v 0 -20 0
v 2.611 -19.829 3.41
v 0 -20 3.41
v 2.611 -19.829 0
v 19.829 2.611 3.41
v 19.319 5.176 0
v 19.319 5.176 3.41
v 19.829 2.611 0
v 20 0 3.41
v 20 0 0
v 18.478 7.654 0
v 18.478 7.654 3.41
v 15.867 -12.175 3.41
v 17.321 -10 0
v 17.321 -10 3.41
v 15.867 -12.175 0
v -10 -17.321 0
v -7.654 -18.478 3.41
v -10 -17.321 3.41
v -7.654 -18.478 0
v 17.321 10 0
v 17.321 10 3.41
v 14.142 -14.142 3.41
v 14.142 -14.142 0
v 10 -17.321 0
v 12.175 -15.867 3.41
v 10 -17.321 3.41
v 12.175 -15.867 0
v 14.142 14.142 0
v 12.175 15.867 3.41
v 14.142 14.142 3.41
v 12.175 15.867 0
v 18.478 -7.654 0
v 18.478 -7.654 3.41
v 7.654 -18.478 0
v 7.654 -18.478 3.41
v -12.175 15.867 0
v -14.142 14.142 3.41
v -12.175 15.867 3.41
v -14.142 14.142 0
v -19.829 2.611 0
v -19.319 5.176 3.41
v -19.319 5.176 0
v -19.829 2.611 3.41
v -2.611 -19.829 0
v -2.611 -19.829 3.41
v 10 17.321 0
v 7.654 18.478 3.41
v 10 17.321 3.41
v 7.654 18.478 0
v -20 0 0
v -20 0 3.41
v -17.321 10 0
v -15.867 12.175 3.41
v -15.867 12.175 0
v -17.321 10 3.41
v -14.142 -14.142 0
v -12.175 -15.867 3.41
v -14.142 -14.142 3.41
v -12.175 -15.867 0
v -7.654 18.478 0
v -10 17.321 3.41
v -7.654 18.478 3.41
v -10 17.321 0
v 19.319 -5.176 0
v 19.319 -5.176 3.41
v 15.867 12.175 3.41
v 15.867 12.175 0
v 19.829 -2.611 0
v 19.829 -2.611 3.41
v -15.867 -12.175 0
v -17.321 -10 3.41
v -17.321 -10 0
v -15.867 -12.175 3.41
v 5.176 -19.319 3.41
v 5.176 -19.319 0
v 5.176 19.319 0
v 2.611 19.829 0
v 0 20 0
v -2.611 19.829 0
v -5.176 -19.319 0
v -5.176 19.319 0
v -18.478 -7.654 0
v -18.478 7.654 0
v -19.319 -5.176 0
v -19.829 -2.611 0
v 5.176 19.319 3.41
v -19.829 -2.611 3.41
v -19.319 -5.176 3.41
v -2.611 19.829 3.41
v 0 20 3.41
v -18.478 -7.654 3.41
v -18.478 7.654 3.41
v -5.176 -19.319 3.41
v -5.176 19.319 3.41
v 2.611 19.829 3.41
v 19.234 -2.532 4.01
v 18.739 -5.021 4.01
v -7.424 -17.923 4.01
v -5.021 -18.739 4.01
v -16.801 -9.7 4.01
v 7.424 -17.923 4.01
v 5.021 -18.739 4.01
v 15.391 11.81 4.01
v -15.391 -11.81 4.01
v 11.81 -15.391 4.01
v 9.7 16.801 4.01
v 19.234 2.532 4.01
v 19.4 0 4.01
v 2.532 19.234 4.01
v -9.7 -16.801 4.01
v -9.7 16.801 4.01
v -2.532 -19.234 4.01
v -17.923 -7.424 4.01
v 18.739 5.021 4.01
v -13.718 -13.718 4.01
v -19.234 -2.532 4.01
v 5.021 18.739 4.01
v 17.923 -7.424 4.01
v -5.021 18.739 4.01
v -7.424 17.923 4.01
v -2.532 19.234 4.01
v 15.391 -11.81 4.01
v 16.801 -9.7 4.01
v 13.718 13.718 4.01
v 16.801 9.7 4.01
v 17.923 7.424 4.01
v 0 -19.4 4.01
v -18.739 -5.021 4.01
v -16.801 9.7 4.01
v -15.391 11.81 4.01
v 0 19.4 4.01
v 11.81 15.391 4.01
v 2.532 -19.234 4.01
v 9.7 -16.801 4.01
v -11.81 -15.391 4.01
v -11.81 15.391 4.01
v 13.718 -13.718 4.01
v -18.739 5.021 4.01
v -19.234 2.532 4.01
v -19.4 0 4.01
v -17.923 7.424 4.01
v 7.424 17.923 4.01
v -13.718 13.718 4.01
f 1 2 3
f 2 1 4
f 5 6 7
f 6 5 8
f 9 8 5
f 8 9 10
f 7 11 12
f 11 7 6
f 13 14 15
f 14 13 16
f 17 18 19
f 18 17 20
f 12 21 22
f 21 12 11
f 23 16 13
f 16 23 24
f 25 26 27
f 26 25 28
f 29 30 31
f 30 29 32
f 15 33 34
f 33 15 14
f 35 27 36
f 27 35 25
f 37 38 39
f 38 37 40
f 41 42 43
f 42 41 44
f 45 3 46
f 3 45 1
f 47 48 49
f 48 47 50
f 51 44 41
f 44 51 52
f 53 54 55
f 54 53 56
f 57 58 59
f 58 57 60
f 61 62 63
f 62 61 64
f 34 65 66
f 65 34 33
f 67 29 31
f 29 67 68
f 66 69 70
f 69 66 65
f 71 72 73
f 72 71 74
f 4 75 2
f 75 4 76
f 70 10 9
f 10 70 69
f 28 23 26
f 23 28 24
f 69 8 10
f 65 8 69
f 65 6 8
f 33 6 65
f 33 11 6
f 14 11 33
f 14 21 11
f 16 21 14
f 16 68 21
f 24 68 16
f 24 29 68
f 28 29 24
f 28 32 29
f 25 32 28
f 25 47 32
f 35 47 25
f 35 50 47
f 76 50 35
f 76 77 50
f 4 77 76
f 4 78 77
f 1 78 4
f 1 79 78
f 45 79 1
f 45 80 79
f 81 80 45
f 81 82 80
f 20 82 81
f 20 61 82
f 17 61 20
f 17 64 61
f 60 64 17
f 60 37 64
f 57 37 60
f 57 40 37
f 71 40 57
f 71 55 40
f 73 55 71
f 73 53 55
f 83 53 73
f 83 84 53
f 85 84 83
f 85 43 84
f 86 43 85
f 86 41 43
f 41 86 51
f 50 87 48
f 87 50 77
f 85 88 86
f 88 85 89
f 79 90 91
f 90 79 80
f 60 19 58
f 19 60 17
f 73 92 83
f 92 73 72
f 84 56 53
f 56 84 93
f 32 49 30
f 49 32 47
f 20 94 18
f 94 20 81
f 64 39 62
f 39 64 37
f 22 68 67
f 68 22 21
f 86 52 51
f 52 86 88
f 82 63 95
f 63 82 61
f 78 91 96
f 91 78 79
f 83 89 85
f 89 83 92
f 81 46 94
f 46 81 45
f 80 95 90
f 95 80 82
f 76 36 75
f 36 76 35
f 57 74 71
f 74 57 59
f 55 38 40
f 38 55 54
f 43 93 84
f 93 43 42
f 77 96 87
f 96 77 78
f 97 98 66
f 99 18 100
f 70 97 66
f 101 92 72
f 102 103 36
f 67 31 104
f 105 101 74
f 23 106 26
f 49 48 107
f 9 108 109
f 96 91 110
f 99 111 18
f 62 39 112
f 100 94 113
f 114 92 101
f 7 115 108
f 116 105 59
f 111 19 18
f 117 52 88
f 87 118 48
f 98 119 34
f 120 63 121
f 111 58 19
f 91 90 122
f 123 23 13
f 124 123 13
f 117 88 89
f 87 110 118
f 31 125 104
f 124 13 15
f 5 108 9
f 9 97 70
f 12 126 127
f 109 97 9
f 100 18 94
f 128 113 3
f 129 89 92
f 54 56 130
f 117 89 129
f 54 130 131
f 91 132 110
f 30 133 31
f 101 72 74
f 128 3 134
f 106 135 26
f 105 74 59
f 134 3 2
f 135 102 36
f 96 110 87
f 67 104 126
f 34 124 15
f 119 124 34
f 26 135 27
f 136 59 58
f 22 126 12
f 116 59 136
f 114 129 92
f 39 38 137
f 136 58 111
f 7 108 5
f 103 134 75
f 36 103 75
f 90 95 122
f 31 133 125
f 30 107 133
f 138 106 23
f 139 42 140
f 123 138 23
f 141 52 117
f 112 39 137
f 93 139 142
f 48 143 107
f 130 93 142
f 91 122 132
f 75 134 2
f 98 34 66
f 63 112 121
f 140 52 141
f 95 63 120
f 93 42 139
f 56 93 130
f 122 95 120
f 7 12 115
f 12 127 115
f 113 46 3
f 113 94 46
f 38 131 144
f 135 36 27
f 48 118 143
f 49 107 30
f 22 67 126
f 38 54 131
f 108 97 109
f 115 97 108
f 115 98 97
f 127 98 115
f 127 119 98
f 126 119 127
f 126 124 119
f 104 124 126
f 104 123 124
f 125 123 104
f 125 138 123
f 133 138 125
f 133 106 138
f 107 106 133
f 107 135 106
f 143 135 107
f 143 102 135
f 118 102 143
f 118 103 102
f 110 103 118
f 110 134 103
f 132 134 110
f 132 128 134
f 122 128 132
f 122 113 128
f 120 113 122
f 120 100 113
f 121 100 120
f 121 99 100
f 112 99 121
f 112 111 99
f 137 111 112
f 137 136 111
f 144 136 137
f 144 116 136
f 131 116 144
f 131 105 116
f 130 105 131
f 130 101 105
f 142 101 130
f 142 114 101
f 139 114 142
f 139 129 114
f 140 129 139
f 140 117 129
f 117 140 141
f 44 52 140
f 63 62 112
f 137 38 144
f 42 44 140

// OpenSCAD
// file: connector.scad
// Shared board-model geometry for the puzzle chess board.
//
// The cell, the pin and the platform all `include` this file so their
// mating dimensions can never drift apart. It defines named dimensions
// only (no top-level geometry), so including it renders nothing on its
// own. Three joints live here:
//   * cell <-> pin      : the dumbbell connector (bottom-loading grooves)
//   * cell <-> platform : the round central socket
//
// ---- Cell footprint ----
cell_size     = 50;   // square tile edge (mm) — a standard tournament cell
corner_radius = 5;    // radius of the rounded vertical corners

// ---- Clearance ----
// Fit control: every mating part differs from its cavity by this much on every
// face. A POSITIVE value is clearance (part shrunk — slides in with a gap); zero
// is a nominal (interference) fit that grips via FDM over-extrusion/roughness.
// Applied ONCE per joint — the cavity is drawn at its nominal size and the
// inserted part is offset by the gap. (Do not also resize the cavity; that
// double-counts the gap.)
// connector_gap is the default (platform joint); the pin uses its own pin_gap
// so the two joints can be tuned independently.
connector_gap = 0;  // platform disc: nominal (interference) fit, same as the pin.
                    // Clearances 0.1 / 0.05 / 0.02 per side all printed with
                    // side-to-side play, so grip on the nominal size instead.
pin_gap       = 0;     // pin-joint clearance per face — nominal (interference) fit,
                       // relies on FDM over-extrusion/roughness to grip firmly
// Deliberate gap left between two joined cells. The dumbbell's waist spans
// this gap, so small height differences between adjacent battlefield tiles
// read as natural seams rather than a visible step.
cell_gap      = 2;

// ---- Dumbbell connector: cell <-> pin ----
// A flat dumbbell-shaped tab lies in a pocket that is OPEN AT THE BOTTOM of
// each cell, so pins drop straight in (or out) from underneath the board —
// even for a tile in the middle of an assembled field, where the old
// side-sliding pin could never reach. Each cell captures one bulb of the
// dumbbell; the narrow waist passes through a slot at the cell's mid-edge,
// and because the bulb is wider than that slot the two cells cannot pull
// apart. All dimensions are the nominal cavity; the pin subtracts the gap.
bulb_radius  = 7;    // radius of each dumbbell head (14 mm across) — wider heads
                     //   give more shoulder behind the neck slot, resisting pull-out
neck_width   = 7;    // width of the waist — must be < 2*bulb_radius; wider = stronger
                     //   in shear, less likely to snap at the seam
groove_depth = 10;   // bulb-chamber centre, measured in from the cell edge; pulled a
                     //   touch deeper so a solid back wall remains behind the wider bulb
pin_thickness = 6;   // vertical (Z) extent of the flat tab — doubled for a much
                     //   stiffer, harder-to-snap connector
pin_top_chamfer    = 0.6;  // decorative bevel on the pin's TOP edge, matching the
                     // platform's top rim. The pin is modelled bevel-up; rotate it upside
                     // down for printing so the bevel lands on the bed. No effect on grip.
pin_bottom_chamfer = 0;    // bevel on the pin's bottom edge (0 = square)
// Vertical slack above the seated pin. Deliberately larger than the radial
// connector_gap: the pocket must be a touch DEEPER than the pin is thick so
// the pin can be pushed all the way in (its face flush with the board bottom)
// without the pocket roof stopping it short.
groove_clearance = 0.8;
// Pocket reaches from the bed (z = 0) up past the tab, leaving the cell body
// above it as a roof — set groove_clearance clear of the pin so it fully seats.
groove_height = pin_thickness + groove_clearance;
// Bulb-centre spacing on the pin: one groove_depth into each cell plus the
// seam gap, so a bulb lands dead-centre in each cell's chamber.
bulb_offset   = groove_depth + cell_gap / 2;

// ---- Central socket: cell <-> platform ----
// A round recess in the middle of the cell holds a separately printed
// platform (print it black or white) whose top finishes flush with the
// surrounding terrain plateau — the flat stage a piece stands on.
platform_radius  = 20;   // the platform disc (40 mm across) — clears a piece base
platform_height  = 4;    // its thickness / how deep it seats
platform_chamfer = 0;    // lead-in bevel on the platform's bottom edge (0 = straight
                         // wall, full radius top-to-bottom for maximum grip surface)
platform_top_chamfer = 0.6;  // decorative bevel on the platform's TOP (visible) edge,
                             // easing the rim where the stage meets the terrain plateau
                             // (like the pin's chamfer). Does not affect the socket grip.
socket_radius = platform_radius;                  // nominal cavity (disc carries the gap)
platform_fit_radius = platform_radius - connector_gap;  // friction fit in the cell
socket_depth  = platform_height + 0.2;            // seats flush or a hair below

$fn = 48;
// main file
// platform — the round stage a chess piece stands on. It is one of the three
// parts of the `board` model (the others are cell.scad and pin.scad).
//
// A disc that friction-fits into the cell's central socket; its top finishes
// flush with the surrounding terrain plateau. Printed separately so it can be
// a different colour from the terrain — print black platforms for the dark
// squares and white ones for the light squares.
//
// Prints flat on the bed, no supports. Print it top-face-down for the smoothest
// visible surface; that puts the top chamfer on the bed, where it flares out at
// 45° (self-supporting) and doubles as elephant-foot relief on the visible rim.
//
// The vertical wall between the chamfers is the full fit radius and does all the
// gripping. platform_chamfer eases the bottom (insertion) edge; platform_top_chamfer
// eases the top (visible) edge. Either may be 0 for a square edge.

include <connector.scad>

platform();

module platform() {
    // Straight gripping wall spans between the two chamfers. Uses the fit radius
    // (nominal minus the friction gap) so it grips the socket without falling out.
    wall_bottom = platform_chamfer;
    wall_top    = platform_height - platform_top_chamfer;
    union() {
        translate([0, 0, wall_bottom])
            cylinder(r = platform_fit_radius, h = wall_top - wall_bottom);
        // Chamfered bottom edge: lead-in as the disc drops into the socket.
        if (platform_chamfer > 0)
            hull() {
                cylinder(r = platform_fit_radius - platform_chamfer, h = 0.01);
                translate([0, 0, platform_chamfer])
                    cylinder(r = platform_fit_radius, h = 0.01);
            }
        // Chamfered top edge: eased visible rim, flush with the terrain plateau.
        if (platform_top_chamfer > 0)
            translate([0, 0, wall_top])
                hull() {
                    cylinder(r = platform_fit_radius, h = 0.01);
                    translate([0, 0, platform_top_chamfer])
                        cylinder(r = platform_fit_radius - platform_top_chamfer, h = 0.01);
                }
    }
}
